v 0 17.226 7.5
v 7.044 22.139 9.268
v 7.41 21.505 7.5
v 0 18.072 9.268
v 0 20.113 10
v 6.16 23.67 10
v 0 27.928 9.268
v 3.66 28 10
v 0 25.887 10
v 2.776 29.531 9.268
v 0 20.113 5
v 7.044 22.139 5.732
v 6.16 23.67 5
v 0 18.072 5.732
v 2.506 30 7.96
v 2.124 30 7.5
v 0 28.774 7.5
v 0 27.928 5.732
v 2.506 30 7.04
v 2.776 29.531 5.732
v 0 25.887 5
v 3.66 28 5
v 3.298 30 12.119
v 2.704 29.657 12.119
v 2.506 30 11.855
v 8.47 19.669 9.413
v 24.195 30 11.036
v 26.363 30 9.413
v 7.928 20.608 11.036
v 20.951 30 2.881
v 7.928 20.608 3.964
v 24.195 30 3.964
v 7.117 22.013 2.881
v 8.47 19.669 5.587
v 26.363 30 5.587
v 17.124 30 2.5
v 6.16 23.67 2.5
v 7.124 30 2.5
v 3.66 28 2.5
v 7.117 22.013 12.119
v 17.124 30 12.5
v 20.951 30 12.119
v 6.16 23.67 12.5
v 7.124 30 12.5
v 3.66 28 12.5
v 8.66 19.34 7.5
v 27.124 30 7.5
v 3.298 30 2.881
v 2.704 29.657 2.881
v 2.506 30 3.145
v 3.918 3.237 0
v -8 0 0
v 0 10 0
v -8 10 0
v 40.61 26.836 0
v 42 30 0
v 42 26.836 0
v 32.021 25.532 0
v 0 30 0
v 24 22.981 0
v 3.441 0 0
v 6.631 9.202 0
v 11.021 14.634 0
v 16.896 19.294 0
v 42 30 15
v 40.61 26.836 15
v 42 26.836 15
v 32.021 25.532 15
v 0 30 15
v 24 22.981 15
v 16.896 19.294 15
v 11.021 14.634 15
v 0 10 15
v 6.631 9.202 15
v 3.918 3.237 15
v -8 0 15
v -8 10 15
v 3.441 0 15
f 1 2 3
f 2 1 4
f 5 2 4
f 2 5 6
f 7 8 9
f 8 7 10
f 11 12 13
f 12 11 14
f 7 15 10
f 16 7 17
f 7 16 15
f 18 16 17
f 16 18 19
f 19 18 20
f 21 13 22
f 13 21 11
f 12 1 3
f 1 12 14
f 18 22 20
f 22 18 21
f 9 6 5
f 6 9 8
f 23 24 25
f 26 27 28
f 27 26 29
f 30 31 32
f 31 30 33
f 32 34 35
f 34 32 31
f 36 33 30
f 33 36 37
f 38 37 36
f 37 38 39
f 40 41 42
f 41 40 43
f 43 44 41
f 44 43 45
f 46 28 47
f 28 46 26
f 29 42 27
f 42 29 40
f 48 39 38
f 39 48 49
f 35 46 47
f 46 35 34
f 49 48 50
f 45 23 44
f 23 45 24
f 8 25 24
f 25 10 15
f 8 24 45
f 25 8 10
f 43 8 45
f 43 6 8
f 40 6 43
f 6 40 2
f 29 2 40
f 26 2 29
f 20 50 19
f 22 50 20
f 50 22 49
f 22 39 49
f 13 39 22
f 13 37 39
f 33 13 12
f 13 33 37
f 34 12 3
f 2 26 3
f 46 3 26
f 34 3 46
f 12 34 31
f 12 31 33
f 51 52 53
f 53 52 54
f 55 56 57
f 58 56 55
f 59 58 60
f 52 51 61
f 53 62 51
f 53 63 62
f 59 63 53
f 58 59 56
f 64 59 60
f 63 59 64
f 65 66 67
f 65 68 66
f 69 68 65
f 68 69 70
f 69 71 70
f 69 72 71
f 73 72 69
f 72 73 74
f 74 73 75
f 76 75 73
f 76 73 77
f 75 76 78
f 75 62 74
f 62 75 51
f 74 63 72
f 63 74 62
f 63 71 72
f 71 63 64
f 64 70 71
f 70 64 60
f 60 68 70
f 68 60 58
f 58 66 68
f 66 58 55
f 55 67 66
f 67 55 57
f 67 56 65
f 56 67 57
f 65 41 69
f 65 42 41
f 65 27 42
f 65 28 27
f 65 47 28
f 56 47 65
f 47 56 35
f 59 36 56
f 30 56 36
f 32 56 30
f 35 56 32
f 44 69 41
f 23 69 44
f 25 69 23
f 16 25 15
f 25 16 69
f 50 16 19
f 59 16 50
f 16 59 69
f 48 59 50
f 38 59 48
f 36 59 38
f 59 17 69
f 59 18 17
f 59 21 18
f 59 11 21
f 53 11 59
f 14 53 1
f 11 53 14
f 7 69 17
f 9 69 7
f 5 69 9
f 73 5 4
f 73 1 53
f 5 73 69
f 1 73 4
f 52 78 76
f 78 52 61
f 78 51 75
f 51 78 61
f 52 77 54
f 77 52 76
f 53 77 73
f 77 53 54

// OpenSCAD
length=42;
depth=30;
thickness=15;
holeDiameter=5;
headDiameter=10;
slot=5;
angle=30;

module bracket()
{
	module hole() {
		hull() {
			cylinder( d=holeDiameter, h=70 );
			translate( [0,-slot,0] ) cylinder( d=holeDiameter, h=70 );
		}
		hull() {
			translate( [0,0,10] ) cylinder( d=headDiameter, h=70 );
			translate( [0,-slot,10] ) cylinder( d=headDiameter, h=70 );
		}
	}

	difference() {
		linear_extrude( thickness )
		difference() {
			square( [length,depth] );
			translate([length+3,-3]) scale([1,depth/length]) circle( length );
		}
		translate( [-5,depth-7,thickness/2] ) rotate( [0,0,angle] ) rotate( [0,90,0] )  hole();
	}
}

module step( l, d )
{
	translate( [-d, 0, 0] ) cube( [d+1,l,thickness] );
}


bracket();
step(10,8);
